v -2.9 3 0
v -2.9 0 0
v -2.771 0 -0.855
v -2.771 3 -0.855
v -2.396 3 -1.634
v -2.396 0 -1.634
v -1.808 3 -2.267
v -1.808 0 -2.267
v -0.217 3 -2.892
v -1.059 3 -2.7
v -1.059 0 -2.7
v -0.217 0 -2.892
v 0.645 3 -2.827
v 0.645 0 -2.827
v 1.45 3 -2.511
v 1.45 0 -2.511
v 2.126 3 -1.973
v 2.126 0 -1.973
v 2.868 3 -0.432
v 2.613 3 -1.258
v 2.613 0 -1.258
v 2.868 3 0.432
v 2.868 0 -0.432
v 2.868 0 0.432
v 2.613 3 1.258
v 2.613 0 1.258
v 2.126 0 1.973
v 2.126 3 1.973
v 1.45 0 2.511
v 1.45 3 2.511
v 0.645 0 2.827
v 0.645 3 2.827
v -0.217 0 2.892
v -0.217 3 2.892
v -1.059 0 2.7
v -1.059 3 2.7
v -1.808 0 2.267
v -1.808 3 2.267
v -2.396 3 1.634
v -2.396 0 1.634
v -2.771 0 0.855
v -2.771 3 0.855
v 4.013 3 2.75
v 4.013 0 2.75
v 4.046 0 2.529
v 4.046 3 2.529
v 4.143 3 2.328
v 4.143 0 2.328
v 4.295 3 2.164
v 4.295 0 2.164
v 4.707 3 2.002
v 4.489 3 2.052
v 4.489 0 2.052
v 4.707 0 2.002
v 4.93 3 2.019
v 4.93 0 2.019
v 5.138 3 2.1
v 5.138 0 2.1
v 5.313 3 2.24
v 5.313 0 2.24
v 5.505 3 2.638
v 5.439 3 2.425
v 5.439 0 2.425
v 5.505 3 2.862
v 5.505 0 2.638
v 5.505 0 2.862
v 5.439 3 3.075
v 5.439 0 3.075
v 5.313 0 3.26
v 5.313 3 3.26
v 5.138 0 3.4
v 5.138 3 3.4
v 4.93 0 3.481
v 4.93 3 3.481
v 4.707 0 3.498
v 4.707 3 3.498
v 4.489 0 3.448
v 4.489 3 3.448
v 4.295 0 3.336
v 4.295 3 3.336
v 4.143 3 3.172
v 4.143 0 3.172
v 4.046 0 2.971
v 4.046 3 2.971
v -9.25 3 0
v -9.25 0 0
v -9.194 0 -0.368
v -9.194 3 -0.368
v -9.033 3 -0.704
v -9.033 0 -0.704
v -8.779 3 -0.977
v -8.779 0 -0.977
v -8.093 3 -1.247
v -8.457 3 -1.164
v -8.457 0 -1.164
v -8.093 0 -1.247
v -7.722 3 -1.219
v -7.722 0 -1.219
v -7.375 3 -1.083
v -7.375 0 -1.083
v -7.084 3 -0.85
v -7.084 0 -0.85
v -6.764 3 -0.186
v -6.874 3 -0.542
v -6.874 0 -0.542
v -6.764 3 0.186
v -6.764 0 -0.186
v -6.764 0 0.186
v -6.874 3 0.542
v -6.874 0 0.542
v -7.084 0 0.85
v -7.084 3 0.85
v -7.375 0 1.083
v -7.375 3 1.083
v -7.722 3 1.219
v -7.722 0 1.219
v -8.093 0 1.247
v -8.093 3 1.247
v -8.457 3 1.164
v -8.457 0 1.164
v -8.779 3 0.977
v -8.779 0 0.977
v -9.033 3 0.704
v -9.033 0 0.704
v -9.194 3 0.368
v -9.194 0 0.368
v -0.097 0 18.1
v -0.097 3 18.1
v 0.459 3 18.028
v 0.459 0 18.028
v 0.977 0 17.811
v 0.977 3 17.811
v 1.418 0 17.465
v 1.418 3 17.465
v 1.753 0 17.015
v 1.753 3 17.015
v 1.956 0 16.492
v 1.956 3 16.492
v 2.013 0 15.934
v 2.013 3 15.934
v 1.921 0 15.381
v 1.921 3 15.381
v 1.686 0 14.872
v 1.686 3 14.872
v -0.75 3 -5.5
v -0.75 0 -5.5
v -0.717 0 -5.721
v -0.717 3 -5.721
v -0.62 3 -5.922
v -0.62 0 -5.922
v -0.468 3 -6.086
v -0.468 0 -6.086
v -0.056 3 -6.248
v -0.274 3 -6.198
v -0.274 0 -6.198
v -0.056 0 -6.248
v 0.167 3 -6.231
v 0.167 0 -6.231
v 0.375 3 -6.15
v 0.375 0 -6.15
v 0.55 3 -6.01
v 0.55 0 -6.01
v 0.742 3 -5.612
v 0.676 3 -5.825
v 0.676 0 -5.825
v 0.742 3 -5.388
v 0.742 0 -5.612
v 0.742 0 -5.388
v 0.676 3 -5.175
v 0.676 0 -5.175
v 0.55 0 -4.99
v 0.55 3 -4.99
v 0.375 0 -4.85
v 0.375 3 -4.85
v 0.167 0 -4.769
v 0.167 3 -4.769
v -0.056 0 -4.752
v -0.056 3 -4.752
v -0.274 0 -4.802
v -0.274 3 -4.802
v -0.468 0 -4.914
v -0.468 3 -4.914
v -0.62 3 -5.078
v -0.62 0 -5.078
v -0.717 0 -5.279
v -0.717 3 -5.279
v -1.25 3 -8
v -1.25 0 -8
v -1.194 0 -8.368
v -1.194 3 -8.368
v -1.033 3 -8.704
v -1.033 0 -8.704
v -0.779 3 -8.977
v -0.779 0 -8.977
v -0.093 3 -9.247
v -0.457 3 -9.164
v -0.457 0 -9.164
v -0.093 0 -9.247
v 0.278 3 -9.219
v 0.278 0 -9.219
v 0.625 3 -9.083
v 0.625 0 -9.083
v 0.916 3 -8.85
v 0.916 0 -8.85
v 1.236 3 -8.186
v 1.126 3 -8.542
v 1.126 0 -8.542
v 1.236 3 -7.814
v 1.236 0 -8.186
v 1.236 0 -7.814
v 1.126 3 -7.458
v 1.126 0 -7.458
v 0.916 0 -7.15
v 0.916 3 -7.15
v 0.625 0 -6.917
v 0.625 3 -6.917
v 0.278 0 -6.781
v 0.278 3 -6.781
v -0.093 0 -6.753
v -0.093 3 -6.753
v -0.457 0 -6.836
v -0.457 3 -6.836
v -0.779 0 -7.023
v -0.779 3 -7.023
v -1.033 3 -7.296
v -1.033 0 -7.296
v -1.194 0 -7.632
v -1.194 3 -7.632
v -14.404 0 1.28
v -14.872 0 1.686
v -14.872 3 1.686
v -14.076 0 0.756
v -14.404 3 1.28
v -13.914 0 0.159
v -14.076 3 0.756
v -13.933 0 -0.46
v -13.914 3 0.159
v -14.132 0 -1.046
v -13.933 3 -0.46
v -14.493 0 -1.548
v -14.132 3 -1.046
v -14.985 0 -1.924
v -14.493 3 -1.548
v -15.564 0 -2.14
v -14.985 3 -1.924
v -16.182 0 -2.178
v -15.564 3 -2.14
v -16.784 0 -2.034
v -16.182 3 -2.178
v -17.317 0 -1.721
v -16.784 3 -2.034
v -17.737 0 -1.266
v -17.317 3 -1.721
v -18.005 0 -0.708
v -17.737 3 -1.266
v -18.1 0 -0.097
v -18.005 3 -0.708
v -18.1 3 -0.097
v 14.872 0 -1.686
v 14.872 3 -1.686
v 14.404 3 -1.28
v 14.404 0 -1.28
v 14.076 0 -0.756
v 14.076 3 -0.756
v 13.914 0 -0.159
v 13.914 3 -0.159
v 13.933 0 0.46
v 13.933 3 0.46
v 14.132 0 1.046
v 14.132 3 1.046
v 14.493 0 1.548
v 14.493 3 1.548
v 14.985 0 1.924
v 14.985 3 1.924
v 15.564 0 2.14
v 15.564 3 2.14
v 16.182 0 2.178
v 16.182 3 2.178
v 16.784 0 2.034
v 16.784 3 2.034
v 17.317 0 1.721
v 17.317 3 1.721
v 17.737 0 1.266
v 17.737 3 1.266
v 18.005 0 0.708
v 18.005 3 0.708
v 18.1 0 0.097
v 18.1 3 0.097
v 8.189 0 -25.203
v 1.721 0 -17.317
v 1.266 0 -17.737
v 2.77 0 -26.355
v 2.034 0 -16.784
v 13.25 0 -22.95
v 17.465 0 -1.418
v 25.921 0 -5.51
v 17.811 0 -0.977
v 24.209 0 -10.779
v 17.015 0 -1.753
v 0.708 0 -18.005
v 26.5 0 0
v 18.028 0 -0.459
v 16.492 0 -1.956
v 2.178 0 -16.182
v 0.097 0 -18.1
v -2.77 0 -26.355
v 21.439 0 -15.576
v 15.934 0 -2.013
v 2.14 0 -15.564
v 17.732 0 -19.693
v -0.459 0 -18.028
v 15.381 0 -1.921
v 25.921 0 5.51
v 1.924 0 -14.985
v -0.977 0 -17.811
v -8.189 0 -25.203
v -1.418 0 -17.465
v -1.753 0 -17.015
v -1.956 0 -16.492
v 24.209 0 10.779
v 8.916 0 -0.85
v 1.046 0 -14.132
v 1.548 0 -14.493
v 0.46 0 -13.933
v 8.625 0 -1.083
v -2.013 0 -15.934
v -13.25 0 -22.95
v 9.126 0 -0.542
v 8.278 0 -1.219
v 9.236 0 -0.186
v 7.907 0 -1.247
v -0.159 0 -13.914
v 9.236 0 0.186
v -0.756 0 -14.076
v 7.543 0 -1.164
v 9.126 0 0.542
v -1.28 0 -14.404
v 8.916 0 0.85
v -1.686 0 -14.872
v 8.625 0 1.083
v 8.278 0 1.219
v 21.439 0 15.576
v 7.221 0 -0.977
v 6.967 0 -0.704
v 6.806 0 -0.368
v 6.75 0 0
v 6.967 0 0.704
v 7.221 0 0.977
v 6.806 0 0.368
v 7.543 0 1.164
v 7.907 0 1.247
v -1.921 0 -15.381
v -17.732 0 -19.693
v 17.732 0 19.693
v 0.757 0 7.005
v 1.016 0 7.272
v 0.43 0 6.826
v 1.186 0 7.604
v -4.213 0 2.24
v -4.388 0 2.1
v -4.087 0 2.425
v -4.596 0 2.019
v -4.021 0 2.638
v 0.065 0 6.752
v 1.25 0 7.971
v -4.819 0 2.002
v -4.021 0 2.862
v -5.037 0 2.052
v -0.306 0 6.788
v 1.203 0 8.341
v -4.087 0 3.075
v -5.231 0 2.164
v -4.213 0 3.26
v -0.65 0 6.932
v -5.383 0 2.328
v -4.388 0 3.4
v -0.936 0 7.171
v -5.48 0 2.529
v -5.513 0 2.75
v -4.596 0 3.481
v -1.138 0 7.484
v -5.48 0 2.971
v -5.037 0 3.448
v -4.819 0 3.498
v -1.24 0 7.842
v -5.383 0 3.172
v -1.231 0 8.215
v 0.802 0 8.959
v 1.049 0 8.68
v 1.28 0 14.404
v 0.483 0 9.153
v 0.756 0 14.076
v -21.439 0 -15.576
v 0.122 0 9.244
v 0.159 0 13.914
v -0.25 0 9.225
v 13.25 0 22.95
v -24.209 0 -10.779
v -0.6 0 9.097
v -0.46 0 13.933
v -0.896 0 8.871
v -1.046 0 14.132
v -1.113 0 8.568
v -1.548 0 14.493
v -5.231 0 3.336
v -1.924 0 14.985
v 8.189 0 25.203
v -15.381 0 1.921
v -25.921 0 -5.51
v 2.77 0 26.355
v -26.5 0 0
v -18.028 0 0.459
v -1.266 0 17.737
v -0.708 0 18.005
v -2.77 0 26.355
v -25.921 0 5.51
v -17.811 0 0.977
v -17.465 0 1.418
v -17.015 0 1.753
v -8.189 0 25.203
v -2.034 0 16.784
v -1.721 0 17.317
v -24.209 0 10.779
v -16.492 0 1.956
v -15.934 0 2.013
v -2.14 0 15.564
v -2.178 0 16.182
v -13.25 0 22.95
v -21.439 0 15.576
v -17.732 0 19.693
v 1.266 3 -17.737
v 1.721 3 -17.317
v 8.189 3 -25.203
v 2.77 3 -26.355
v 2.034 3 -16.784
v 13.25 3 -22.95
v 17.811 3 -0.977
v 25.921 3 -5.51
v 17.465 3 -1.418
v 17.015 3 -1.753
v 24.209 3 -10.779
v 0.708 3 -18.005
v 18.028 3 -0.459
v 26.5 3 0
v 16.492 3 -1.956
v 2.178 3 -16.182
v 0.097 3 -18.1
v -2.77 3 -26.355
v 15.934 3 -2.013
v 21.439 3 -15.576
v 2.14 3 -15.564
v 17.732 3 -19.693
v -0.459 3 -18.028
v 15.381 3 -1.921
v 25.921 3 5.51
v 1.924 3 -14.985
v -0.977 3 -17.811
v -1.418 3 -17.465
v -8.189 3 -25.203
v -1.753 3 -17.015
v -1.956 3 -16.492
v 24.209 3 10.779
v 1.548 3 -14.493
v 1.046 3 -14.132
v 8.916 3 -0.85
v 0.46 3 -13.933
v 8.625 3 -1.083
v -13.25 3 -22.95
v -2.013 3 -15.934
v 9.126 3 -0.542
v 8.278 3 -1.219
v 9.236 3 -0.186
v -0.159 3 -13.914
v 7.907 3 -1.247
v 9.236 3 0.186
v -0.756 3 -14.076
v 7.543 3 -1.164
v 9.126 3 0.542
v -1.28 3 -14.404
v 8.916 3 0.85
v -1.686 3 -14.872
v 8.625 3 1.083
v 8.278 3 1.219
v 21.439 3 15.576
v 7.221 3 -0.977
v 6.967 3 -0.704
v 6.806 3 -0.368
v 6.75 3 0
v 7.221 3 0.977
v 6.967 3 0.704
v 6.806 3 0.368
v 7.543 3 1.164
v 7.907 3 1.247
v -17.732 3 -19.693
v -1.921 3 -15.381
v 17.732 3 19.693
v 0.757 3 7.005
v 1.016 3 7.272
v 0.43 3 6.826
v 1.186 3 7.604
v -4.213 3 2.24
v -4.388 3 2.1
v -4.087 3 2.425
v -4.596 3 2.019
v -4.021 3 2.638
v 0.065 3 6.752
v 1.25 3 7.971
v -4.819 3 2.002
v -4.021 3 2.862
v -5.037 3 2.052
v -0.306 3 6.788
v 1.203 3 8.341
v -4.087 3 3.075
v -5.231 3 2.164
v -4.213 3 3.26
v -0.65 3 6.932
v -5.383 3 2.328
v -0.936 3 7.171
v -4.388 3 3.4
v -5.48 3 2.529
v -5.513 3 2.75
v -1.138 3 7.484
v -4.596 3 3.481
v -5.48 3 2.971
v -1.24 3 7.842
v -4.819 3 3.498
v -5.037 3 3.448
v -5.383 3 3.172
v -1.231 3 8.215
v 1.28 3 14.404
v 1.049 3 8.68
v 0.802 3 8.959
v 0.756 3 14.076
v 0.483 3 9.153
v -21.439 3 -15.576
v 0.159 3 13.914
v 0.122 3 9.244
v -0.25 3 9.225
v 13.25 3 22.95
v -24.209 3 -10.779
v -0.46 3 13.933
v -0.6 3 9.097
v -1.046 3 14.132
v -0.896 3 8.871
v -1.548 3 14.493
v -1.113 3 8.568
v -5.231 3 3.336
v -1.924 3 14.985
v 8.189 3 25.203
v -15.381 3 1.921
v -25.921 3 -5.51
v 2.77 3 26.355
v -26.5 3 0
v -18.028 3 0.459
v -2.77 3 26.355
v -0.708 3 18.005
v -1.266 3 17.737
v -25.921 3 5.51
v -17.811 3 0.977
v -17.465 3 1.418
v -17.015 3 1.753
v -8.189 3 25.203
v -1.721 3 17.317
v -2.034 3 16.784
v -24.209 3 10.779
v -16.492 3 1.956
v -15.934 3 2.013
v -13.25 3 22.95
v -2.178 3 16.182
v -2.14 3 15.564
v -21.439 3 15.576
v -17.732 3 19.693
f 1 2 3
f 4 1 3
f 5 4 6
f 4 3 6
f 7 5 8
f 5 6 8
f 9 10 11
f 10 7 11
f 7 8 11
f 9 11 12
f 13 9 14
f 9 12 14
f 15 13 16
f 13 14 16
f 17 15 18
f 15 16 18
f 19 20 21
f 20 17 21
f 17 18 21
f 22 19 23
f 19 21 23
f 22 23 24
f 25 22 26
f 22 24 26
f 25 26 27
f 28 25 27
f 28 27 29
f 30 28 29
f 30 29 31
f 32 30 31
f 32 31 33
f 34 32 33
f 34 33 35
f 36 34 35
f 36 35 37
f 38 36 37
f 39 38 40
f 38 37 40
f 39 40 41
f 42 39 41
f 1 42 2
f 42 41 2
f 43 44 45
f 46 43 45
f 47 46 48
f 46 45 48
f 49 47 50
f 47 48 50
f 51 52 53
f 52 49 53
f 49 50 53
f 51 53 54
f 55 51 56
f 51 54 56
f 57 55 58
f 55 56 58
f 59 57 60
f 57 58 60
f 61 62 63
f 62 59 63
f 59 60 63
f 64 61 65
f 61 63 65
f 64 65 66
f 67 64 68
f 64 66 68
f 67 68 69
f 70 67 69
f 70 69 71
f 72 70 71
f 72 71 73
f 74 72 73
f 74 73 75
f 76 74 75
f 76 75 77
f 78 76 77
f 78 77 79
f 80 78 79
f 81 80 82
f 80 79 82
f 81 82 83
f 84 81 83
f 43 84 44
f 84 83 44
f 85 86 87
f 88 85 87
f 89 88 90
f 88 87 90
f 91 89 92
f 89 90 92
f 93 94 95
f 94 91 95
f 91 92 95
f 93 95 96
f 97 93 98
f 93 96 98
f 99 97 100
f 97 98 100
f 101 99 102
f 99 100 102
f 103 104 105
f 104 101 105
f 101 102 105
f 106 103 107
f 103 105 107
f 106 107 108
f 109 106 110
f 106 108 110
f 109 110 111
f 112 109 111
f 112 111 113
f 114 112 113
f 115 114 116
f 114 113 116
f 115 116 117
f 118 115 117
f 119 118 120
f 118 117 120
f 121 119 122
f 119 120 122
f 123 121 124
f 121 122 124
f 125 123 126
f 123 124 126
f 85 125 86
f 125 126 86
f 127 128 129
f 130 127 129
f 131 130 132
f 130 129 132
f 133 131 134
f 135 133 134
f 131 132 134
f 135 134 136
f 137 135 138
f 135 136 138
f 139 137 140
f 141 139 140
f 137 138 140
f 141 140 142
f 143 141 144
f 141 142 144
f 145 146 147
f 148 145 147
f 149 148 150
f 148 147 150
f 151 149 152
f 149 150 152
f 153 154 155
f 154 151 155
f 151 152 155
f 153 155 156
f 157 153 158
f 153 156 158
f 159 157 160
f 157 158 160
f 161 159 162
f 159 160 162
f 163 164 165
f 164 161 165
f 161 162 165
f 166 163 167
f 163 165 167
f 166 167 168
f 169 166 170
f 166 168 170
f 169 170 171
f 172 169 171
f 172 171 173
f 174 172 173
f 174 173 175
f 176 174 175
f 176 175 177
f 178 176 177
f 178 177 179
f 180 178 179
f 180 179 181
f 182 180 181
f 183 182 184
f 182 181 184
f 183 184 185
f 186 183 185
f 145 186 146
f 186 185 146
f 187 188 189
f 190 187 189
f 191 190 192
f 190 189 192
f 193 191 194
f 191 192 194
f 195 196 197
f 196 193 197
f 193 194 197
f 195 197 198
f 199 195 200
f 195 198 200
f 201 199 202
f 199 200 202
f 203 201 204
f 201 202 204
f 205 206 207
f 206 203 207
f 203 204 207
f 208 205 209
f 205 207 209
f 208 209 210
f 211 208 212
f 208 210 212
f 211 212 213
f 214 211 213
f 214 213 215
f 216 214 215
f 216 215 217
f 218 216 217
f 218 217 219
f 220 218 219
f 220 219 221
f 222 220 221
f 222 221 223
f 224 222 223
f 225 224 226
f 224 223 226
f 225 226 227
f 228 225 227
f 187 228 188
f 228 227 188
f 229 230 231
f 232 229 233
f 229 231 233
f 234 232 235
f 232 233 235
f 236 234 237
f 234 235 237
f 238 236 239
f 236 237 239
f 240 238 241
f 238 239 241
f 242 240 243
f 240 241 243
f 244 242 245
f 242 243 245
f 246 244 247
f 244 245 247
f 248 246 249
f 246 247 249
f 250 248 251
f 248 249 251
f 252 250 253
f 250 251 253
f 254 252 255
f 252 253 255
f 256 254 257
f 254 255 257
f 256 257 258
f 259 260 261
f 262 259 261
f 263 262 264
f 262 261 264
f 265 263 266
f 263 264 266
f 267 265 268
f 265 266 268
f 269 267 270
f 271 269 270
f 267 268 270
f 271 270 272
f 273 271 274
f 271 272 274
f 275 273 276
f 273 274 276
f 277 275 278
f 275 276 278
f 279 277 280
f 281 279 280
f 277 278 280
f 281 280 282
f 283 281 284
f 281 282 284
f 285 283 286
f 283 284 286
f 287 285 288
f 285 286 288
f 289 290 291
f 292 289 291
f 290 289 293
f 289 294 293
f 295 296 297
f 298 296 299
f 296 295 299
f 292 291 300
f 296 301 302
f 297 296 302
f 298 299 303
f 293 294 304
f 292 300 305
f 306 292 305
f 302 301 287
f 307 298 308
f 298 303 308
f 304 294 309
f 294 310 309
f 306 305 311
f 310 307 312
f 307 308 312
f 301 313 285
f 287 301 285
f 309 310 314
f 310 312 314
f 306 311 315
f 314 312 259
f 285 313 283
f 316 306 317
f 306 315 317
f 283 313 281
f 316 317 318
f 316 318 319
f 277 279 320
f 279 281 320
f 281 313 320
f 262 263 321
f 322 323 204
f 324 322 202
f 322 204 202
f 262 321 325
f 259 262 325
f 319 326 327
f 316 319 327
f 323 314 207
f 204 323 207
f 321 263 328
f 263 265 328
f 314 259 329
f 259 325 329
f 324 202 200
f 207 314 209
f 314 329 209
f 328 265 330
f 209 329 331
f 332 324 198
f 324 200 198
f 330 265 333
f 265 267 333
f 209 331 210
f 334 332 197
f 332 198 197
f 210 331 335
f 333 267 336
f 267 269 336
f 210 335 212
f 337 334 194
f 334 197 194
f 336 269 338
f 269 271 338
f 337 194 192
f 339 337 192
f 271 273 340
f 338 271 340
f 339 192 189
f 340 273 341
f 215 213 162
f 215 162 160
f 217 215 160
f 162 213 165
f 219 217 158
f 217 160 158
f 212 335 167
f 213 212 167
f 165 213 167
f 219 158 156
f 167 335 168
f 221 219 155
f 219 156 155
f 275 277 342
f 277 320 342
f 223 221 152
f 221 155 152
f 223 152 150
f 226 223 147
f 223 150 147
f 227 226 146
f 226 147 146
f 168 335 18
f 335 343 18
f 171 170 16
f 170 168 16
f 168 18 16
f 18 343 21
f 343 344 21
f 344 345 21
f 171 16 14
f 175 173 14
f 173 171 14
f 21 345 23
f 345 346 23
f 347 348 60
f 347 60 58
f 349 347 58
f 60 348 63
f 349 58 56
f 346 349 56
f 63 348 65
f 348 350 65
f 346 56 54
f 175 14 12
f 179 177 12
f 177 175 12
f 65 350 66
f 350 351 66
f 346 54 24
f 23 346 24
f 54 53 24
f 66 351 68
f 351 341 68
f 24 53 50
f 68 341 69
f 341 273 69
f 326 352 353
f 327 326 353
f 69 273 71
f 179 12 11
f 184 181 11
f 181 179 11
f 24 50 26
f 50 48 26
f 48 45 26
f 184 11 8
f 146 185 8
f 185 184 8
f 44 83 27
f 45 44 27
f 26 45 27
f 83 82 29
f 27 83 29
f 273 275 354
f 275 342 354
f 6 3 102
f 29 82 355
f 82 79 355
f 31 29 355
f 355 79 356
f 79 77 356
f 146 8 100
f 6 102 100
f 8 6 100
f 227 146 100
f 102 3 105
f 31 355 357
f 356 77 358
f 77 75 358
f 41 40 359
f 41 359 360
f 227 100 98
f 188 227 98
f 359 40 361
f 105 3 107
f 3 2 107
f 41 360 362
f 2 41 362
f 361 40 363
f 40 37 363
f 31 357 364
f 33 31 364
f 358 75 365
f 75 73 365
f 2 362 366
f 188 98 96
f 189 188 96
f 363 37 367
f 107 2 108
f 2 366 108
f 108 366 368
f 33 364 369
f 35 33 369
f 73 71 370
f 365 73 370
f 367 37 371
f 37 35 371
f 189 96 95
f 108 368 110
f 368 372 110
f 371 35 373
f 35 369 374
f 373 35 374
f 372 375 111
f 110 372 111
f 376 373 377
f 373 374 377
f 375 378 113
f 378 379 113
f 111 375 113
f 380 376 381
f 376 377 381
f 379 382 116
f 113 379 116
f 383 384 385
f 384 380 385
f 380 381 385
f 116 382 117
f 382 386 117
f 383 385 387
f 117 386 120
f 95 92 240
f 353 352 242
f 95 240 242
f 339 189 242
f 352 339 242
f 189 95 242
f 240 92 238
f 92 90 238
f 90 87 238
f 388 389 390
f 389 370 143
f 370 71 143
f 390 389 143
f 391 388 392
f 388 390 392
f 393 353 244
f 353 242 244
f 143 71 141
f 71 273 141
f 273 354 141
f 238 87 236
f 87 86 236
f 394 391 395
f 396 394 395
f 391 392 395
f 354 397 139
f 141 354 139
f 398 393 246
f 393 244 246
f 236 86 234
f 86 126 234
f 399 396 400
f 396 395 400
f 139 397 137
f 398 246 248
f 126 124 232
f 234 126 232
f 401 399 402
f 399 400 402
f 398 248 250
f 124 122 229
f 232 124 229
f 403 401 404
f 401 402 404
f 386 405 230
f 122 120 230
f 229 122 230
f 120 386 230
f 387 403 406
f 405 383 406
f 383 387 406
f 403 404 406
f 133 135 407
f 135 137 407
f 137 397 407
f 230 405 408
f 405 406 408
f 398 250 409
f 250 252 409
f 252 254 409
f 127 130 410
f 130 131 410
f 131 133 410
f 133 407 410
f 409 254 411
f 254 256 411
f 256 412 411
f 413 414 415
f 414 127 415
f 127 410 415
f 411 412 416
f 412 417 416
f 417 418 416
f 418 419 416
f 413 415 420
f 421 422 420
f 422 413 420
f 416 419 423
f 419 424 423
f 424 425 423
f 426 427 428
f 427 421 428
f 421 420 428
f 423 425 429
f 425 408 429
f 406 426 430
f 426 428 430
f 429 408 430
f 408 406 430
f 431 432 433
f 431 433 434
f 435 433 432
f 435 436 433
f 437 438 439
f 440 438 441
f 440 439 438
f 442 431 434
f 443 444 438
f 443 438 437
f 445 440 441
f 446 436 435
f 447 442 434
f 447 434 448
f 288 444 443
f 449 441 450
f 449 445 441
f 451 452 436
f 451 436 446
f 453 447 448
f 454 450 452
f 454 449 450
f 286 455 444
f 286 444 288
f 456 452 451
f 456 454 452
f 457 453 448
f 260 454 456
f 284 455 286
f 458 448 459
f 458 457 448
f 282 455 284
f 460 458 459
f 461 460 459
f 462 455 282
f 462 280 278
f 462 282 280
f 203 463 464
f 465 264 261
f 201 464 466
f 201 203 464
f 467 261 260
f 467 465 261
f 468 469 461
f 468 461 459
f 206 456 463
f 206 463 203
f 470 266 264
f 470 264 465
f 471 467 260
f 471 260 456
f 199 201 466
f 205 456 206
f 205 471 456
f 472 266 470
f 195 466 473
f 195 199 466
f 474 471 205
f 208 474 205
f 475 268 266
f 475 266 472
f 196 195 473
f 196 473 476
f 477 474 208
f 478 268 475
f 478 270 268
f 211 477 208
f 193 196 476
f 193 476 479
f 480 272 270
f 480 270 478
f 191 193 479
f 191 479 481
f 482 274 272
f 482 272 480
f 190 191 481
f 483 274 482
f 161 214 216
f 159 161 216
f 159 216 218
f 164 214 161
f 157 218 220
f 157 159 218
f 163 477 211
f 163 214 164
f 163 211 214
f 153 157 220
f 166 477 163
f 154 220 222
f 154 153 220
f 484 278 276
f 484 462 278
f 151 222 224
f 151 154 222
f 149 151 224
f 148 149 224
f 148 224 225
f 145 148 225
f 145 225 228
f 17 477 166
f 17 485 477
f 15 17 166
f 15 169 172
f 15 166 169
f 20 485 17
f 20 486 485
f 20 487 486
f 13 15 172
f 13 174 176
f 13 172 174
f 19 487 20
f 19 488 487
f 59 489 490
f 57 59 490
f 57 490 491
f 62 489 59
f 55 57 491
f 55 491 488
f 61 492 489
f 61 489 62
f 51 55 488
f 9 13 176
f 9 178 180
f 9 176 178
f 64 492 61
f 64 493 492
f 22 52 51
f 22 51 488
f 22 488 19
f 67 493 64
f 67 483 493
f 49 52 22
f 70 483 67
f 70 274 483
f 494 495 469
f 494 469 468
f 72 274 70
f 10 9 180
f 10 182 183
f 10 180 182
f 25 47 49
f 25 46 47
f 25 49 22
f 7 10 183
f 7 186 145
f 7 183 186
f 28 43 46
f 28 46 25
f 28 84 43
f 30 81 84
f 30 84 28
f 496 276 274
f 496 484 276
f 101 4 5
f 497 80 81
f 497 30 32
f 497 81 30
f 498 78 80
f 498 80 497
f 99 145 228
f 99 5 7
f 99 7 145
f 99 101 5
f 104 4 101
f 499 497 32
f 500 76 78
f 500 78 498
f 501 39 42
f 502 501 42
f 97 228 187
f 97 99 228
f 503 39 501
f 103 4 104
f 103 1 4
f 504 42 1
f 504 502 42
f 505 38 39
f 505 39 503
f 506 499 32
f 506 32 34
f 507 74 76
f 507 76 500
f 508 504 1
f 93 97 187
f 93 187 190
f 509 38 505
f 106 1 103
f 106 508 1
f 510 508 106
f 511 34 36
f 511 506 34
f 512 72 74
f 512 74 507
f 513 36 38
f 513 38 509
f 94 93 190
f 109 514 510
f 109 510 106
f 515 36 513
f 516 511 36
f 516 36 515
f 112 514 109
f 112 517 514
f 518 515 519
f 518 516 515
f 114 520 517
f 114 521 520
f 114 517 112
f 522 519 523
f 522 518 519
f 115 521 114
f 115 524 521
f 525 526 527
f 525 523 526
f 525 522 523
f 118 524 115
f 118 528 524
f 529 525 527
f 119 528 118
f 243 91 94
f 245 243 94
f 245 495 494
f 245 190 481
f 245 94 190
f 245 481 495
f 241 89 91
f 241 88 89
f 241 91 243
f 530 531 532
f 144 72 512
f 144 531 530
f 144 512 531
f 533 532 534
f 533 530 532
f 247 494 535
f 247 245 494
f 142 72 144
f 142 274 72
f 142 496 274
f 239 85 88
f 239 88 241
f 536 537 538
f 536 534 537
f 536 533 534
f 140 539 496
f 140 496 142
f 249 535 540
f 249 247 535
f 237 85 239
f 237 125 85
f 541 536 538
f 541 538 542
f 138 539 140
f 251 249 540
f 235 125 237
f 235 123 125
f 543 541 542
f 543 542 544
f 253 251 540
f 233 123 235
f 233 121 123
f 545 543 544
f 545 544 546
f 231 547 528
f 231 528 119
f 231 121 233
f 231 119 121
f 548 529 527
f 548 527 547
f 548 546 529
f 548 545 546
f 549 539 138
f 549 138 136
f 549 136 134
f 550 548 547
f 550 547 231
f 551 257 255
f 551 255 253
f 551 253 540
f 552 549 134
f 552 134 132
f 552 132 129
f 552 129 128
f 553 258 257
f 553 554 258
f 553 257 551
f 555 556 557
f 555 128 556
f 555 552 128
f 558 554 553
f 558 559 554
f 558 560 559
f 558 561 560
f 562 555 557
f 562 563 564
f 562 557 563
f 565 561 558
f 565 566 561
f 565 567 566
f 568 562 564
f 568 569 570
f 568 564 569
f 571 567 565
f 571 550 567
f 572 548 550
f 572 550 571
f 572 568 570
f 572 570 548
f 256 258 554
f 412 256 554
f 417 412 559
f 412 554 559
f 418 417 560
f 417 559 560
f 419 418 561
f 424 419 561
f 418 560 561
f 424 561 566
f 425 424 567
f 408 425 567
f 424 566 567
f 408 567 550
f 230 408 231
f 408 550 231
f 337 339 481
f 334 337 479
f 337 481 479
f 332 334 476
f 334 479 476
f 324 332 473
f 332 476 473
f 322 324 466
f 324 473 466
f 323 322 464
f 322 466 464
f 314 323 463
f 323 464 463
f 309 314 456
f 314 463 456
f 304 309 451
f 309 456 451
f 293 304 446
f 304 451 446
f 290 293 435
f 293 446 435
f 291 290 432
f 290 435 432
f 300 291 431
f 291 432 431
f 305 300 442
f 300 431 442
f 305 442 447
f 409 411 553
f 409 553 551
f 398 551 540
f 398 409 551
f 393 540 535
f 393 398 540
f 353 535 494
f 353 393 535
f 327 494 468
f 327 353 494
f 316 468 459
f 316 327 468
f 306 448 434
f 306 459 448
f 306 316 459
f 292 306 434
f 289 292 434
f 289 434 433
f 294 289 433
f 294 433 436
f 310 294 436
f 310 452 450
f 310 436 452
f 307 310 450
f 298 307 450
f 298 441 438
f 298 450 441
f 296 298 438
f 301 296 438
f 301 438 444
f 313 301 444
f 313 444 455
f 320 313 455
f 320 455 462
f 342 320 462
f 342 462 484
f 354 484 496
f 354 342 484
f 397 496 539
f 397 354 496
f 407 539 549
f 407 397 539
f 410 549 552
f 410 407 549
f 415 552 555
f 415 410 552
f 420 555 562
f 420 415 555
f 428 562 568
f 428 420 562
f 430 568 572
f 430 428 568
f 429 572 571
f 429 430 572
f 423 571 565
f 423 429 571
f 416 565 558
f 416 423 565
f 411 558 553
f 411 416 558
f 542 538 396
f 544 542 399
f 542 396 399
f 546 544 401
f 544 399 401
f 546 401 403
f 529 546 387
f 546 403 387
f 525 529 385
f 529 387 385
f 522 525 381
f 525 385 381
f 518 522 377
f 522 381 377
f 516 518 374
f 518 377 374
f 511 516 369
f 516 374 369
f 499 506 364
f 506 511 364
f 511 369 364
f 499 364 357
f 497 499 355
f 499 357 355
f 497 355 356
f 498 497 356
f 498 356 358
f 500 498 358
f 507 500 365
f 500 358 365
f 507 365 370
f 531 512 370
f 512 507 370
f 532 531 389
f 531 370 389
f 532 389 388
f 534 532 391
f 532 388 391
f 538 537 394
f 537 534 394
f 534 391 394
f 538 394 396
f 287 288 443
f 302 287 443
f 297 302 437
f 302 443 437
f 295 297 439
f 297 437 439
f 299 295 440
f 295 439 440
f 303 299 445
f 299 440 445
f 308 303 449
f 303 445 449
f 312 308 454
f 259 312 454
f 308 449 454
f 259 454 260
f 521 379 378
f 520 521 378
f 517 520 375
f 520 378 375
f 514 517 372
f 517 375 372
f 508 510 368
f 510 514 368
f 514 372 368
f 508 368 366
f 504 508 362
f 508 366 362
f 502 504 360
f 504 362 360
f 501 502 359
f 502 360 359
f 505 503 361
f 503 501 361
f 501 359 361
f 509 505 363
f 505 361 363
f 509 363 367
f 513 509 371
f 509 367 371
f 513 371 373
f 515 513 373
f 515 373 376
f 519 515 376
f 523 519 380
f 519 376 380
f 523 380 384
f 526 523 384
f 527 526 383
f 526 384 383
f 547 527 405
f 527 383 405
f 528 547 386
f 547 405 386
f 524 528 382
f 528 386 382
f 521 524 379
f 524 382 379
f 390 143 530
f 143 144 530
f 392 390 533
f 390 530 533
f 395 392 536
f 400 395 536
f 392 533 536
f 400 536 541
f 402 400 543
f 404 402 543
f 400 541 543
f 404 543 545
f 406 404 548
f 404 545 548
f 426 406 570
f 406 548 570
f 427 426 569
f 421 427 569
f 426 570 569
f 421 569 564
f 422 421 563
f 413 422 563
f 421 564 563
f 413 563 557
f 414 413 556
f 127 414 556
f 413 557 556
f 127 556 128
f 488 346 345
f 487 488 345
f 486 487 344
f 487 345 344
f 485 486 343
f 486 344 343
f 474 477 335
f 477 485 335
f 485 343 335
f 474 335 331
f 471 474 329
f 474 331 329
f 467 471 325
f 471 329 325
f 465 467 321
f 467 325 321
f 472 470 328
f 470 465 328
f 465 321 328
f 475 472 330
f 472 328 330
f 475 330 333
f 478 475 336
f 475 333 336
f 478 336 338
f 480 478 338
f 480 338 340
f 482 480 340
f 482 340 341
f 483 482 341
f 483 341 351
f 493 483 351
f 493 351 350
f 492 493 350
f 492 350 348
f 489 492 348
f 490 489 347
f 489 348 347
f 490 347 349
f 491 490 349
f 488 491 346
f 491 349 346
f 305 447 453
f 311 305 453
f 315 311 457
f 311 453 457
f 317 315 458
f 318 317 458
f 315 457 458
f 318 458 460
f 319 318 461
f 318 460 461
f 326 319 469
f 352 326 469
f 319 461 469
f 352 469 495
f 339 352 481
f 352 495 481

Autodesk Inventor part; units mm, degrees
ref_plane "YZ Plane" through (0, 0, 0) normal (1, 0, 0) x (0, 1, 0)
ref_plane "XZ Plane" through (0, 0, 0) normal (0, 1, 0) x (-1, 0, 0)
ref_plane "XY Plane" through (0, 0, 0) normal (0, 0, 1) x (1, 0, 0)
sketch "Эскиз1" plane through (0, 0, 0) normal (0, 1, 0) x (-1, 0, 0)
  arc A0 (-0.25, 9.2247) -> (0.25, 9.2247) centre (0, 8) ccw
  line L0 (-0.25, 10.9972) -> (-0.25, 9.2247)
  arc A1 (-0.25, 10.9972) -> (-1.1469, -10.94) centre (0, 0) ccw
  line L1 (-1.1469, -10.6297) -> (-1.1469, -10.94)
  line L2 (-0.8473, -10.6297) -> (-1.1469, -10.6297)
  line L3 (-0.8473, -10.9673) -> (-0.8473, -10.6297)
  arc A2 (-0.8473, -10.9673) -> (0.8535, -10.9668) centre (0, 0) ccw
  line L4 (0.8535, -10.6297) -> (0.8535, -10.9668)
  line L5 (1.1541, -10.6297) -> (0.8535, -10.6297)
  line L6 (1.1541, -10.9393) -> (1.1541, -10.6297)
  arc A3 (1.1541, -10.9393) -> (0.25, 10.9972) centre (0, 0) ccw
  line L7 (0.25, 9.2247) -> (0.25, 10.9972)
  circle A4 centre (8, 0) radius 1.25
  circle A5 centre (0, -8) radius 1.25
  circle A6 centre (-8, 0) radius 1.25
  circle A7 centre (0, -5.5) radius 0.75
  circle A8 centre (4.7631, 2.75) radius 0.75
  circle A9 centre (-4.7631, 2.75) radius 0.75
  circle A10 centre (0, 0) radius 2.9
  arc A11 (0.25, 9.2247) -> (-0.25, 9.2247) centre (0, 8) ccw
  circle A12 centre (0, 0) radius 26.5
  point P0 (0, 0)
  dimension "d3" = 53
extrude "Выдавливание1" add sketch "Эскиз1" along normal blind 3 contours A0 L7 A3 L6 L5 L4 A2 L3 L2 L1 A1 L0 | A12
sketch "Эскиз2" plane through (0, 3, 0) normal (0, 1, 0) x (1, 0, 0)
  arc A0 (-14.8717, -1.6857) -> (-18.0997, 0.0968) centre (-15.9998, 0.0856) ccw
  arc A1 (-6.8718, -1.7285) -> (-9.1468, -1.7163) centre (-7.9999, 0.0428) ccw
  circle A2 centre (0, 0) radius 4
  arc A3 (-1.7285, 6.8718) -> (-1.7163, 9.1468) centre (0.0428, 7.9999) ccw
  arc A4 (-1.6857, 14.8717) -> (0.0968, 18.0997) centre (0.0856, 15.9998) ccw
  arc A5 (6.8718, 1.7285) -> (9.1468, 1.7163) centre (7.9999, -0.0428) ccw
  arc A6 (14.8717, 1.6857) -> (18.0997, -0.0968) centre (15.9998, -0.0856) ccw
  arc A7 (1.7285, -6.8718) -> (1.7163, -9.1468) centre (-0.0428, -7.9999) ccw
  arc A8 (1.6857, -14.8717) -> (-0.0968, -18.0997) centre (-0.0856, -15.9998) ccw
  circle A9 centre (-15.9998, 0.0856) radius 2.1
  circle A10 centre (-7.9999, 0.0428) radius 2.1
  circle A11 centre (0, 0) radius 4
  circle A12 centre (0.0428, 7.9999) radius 2.1
  circle A13 centre (0.0856, 15.9998) radius 2.1
  circle A14 centre (7.9999, -0.0428) radius 2.1
  circle A15 centre (15.9998, -0.0856) radius 2.1
  circle A16 centre (-0.0428, -7.9999) radius 2.1
  circle A17 centre (-0.0856, -15.9998) radius 2.1
  dimension "d4" = 4.2
extrude "Выдавливание2" cut sketch "Эскиз2" against normal blind 10 contours A9 A0 | A13 A4 | A15 A6 | A17 A8
properties part number "КВ33.044.405 -  Боковина шкива"
